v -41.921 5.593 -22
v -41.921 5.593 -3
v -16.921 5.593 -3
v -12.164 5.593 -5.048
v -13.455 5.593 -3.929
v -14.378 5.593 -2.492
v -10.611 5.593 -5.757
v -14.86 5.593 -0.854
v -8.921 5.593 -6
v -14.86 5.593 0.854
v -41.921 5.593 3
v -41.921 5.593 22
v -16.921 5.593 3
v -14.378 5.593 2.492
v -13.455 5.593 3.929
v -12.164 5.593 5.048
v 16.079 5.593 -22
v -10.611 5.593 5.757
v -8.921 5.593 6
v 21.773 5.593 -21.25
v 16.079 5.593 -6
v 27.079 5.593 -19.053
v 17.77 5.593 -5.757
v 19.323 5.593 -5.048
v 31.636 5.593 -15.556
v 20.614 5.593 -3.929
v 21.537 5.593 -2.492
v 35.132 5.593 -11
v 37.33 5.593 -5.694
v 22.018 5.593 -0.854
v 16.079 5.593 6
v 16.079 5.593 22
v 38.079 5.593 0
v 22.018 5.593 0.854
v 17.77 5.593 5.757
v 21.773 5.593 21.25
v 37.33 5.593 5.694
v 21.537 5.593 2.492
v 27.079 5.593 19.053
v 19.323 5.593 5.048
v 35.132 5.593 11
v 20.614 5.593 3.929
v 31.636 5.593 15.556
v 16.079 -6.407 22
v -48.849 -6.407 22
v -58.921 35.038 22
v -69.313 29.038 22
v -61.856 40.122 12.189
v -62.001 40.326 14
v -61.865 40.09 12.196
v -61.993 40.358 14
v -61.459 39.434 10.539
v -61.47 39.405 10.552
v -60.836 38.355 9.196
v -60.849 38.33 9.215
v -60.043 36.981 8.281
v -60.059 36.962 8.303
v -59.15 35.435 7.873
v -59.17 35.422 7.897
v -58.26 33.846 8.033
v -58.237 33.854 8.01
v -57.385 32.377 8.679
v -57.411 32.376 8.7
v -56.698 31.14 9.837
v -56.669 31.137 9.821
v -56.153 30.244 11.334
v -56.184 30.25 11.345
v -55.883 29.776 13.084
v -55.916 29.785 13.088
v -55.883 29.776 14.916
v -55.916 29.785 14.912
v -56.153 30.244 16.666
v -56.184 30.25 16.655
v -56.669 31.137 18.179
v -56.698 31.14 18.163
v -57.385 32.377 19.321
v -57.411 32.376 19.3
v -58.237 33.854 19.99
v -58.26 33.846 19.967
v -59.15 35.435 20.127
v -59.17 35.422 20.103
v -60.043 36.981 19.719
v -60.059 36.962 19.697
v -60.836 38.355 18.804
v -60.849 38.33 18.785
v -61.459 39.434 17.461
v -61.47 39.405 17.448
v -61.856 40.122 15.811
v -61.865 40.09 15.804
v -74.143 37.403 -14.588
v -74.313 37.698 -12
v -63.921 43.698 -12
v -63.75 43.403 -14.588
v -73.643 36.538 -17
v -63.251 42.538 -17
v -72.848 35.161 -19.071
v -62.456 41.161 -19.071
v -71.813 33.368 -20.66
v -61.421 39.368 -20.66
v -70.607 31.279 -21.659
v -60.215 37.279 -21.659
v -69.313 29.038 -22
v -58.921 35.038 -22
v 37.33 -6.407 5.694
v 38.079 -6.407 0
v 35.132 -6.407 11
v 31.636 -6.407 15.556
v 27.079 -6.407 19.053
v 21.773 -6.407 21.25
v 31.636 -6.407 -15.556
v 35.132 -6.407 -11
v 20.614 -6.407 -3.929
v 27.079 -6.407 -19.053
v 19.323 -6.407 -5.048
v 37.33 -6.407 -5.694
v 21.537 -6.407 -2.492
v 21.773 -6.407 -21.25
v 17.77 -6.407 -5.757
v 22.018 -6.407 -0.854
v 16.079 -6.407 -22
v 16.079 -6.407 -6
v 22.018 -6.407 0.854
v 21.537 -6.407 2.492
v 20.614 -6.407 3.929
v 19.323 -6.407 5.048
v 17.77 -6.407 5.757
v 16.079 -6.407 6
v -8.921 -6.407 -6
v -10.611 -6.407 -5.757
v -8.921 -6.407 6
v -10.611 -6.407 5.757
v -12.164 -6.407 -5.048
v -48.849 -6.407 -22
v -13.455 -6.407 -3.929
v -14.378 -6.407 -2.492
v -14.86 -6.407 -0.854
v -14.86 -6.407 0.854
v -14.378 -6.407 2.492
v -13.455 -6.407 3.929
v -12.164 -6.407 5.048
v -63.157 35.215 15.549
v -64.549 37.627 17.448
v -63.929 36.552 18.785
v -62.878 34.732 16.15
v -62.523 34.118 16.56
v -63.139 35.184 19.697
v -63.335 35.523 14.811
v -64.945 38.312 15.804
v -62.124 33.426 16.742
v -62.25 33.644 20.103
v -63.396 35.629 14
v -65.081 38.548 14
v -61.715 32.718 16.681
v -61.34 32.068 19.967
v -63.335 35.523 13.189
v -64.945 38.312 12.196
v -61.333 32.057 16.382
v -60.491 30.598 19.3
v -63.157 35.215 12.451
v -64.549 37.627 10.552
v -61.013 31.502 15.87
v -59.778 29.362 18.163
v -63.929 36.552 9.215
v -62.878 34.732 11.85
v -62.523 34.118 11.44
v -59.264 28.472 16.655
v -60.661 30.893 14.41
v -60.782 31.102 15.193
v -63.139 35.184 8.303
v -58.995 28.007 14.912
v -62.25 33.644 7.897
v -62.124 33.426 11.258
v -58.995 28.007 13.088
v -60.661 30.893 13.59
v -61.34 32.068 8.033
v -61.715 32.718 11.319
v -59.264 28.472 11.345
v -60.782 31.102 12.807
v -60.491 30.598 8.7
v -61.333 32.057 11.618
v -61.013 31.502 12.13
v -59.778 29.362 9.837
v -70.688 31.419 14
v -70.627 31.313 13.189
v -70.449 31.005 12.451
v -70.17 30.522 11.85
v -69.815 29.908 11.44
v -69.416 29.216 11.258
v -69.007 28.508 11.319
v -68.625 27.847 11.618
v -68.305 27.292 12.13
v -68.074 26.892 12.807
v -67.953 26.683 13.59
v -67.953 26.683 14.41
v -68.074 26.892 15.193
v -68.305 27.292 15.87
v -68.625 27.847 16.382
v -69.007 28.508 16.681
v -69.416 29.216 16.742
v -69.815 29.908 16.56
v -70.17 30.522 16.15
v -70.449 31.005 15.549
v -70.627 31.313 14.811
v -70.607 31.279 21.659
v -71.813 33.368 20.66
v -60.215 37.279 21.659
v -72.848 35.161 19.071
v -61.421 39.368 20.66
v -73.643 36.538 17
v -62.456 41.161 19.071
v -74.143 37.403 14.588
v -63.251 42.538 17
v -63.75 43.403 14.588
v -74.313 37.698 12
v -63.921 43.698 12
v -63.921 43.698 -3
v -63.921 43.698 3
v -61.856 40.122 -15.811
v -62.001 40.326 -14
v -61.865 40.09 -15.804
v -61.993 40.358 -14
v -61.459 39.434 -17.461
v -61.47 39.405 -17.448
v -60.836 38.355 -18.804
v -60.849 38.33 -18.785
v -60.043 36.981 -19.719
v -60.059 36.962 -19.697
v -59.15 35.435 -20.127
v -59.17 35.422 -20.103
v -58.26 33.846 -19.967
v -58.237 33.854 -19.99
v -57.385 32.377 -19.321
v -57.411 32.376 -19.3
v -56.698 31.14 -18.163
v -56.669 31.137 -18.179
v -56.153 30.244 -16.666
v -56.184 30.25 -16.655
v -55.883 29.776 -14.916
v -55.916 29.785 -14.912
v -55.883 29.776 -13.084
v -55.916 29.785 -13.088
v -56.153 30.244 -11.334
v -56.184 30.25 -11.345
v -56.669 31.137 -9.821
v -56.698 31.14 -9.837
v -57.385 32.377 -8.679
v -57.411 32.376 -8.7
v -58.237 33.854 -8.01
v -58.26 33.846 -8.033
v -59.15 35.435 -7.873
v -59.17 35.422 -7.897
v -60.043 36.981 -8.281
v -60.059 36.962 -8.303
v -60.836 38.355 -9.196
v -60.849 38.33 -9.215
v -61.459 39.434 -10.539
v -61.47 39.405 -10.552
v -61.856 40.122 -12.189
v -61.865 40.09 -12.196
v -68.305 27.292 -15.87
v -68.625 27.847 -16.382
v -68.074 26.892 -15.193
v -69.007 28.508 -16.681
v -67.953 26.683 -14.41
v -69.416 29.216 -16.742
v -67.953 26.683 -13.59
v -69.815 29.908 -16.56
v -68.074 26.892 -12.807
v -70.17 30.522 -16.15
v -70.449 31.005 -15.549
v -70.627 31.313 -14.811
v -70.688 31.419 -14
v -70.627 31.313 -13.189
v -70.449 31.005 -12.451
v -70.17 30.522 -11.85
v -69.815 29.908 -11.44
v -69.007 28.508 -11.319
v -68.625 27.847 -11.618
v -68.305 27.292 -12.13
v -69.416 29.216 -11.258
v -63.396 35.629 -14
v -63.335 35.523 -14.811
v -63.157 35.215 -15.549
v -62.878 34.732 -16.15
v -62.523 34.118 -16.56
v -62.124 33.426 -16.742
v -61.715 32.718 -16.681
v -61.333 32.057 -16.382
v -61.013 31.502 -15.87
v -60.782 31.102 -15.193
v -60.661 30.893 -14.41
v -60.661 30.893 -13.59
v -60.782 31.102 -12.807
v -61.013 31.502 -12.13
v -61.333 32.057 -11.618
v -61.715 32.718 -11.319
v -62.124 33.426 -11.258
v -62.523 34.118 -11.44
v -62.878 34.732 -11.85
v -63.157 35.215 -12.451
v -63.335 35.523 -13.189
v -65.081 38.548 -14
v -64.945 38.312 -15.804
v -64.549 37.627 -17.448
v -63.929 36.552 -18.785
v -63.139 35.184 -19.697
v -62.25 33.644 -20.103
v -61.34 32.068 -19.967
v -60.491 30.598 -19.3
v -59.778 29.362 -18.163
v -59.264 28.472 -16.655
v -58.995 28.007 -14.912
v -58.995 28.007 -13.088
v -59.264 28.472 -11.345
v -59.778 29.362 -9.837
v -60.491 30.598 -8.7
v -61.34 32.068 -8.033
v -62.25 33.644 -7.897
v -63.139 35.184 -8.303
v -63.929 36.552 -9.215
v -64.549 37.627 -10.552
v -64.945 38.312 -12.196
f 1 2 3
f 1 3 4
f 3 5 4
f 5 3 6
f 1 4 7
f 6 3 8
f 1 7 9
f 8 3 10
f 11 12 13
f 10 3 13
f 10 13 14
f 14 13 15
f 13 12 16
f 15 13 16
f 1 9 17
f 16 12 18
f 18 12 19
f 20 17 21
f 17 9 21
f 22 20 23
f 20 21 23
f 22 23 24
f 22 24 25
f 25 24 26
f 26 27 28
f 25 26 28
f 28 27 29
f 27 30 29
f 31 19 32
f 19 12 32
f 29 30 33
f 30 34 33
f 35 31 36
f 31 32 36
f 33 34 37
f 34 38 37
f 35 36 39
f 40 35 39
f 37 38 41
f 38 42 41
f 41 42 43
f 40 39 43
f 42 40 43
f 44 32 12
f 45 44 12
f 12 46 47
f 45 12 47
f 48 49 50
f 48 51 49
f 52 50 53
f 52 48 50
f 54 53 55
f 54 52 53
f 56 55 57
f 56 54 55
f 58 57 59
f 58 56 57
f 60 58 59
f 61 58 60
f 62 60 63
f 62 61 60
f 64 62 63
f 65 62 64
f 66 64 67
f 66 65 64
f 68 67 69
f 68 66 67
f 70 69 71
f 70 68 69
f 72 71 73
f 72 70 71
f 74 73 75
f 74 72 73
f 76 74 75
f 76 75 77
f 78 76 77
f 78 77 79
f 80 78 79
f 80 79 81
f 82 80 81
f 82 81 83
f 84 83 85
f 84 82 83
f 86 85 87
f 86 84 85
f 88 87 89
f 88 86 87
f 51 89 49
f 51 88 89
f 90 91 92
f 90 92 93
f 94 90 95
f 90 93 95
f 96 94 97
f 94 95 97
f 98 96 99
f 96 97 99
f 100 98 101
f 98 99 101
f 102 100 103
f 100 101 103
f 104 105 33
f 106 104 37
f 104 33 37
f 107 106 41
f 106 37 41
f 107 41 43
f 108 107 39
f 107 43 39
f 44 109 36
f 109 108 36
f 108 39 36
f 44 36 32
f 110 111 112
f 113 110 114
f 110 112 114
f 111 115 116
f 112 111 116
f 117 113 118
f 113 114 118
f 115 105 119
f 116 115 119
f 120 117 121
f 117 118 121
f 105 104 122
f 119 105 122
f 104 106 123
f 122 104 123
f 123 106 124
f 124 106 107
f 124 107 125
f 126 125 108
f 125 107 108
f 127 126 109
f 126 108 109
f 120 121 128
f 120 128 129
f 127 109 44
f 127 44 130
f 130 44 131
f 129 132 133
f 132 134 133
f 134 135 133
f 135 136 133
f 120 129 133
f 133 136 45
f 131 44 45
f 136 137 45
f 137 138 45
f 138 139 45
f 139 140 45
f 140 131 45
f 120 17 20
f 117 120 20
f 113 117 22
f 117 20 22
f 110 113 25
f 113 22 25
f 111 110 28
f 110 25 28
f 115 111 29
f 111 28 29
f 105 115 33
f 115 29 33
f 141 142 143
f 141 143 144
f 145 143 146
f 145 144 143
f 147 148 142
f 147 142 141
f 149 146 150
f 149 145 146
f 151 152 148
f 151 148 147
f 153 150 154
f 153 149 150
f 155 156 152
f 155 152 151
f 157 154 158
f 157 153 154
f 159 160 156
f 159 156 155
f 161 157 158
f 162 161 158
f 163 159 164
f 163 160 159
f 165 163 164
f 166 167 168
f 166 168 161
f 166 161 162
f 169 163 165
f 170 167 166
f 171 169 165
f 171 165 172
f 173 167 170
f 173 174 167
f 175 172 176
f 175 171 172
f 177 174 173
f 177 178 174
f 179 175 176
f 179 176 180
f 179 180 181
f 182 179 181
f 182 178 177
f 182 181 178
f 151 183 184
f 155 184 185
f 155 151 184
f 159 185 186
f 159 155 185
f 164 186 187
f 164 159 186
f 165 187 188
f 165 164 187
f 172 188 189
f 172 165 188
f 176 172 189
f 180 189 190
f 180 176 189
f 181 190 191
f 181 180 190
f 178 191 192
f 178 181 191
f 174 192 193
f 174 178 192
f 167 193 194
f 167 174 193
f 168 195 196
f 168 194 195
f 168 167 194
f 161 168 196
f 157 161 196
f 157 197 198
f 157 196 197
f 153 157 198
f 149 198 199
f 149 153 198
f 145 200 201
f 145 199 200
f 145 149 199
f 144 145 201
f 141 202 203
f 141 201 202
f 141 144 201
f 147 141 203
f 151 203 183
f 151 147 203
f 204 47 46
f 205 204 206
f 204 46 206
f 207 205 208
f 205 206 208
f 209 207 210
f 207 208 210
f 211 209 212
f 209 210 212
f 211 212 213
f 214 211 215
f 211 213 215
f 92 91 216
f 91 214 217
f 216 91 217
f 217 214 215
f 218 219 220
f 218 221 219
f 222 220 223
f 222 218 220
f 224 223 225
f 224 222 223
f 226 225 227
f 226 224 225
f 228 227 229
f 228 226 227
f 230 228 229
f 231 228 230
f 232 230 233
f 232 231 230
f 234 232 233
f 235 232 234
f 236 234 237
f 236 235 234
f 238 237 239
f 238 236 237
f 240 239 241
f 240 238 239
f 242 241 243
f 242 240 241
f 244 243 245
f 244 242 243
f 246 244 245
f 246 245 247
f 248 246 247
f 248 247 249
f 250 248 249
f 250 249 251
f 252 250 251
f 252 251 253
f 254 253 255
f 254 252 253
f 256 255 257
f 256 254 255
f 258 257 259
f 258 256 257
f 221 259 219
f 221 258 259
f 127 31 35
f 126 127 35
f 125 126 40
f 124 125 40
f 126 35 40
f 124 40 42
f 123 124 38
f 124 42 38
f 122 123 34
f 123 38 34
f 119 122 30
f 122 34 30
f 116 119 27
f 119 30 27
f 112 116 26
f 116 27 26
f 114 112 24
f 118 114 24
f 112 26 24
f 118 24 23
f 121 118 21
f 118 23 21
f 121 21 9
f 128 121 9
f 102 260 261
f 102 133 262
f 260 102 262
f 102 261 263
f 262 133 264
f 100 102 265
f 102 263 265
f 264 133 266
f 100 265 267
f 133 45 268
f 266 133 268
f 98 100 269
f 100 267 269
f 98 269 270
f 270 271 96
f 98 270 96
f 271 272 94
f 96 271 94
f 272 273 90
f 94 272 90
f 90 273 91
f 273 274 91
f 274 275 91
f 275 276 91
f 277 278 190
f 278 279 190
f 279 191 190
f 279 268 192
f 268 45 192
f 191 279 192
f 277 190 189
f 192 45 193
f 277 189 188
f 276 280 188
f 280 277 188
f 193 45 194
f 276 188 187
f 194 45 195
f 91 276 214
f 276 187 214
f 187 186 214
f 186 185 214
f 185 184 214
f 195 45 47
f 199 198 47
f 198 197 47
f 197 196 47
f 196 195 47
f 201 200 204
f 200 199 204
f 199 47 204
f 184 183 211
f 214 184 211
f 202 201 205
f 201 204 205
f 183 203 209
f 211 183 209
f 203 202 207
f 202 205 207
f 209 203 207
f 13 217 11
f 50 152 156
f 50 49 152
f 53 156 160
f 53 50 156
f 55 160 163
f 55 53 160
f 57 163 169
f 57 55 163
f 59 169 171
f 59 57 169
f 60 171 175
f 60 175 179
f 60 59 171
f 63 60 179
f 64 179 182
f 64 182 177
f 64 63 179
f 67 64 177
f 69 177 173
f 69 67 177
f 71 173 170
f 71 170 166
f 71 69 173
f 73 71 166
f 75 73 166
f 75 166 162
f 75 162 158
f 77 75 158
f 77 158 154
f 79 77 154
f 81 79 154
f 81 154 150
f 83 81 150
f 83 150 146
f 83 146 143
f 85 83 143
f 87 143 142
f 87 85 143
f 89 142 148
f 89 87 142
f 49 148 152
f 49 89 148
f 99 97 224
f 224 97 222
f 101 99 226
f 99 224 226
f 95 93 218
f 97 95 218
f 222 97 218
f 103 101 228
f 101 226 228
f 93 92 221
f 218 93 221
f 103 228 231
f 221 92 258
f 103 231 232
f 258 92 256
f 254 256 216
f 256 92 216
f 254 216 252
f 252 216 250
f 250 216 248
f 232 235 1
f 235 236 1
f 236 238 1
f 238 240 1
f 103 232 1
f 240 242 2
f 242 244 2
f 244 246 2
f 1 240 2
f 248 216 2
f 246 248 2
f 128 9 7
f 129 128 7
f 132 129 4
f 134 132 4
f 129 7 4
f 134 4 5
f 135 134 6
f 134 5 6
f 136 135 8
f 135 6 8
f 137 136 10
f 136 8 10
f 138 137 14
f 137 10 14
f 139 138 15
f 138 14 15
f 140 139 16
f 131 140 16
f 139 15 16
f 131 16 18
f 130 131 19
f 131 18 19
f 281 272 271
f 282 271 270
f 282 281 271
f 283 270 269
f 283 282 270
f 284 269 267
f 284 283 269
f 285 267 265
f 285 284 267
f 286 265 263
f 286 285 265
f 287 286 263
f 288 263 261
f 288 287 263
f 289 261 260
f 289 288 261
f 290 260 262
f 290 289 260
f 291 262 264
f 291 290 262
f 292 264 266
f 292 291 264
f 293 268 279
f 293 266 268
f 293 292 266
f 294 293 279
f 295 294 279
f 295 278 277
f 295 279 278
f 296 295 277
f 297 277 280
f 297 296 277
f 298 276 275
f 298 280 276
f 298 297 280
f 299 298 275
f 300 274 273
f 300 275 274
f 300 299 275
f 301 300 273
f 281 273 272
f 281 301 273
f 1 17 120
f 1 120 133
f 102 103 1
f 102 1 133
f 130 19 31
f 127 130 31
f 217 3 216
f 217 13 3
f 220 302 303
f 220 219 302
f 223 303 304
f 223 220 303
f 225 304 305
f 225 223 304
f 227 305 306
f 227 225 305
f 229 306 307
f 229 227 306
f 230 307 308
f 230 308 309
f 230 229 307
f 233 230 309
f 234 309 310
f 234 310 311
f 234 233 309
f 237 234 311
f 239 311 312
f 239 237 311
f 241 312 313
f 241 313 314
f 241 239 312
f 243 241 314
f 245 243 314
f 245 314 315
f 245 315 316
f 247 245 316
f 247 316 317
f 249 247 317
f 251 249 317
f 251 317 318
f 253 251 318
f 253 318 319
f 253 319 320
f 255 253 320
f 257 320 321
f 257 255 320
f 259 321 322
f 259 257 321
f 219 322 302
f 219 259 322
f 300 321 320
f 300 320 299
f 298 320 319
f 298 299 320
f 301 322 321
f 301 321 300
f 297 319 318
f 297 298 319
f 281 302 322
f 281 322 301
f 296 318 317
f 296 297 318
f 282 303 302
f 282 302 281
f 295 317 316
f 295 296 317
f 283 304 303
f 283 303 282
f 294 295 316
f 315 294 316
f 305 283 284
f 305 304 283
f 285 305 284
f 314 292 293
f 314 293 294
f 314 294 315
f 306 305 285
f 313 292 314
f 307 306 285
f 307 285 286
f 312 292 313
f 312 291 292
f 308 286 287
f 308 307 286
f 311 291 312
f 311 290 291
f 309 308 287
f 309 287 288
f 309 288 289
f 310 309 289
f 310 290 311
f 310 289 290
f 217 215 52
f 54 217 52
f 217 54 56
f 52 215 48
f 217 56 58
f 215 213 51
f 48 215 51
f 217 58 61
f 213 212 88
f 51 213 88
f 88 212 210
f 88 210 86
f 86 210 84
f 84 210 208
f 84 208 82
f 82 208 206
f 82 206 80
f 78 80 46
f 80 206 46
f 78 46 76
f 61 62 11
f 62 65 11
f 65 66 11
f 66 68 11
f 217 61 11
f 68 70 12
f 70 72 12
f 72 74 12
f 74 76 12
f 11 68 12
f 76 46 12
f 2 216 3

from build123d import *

# Parameters (mm, degrees)
BOSS_EXTRUDE1_DEPTH                    = 22
CBORE_FOR_M5_HEX_HEAD_BOLT1_AT_2_COUNT = 2
CBORE_FOR_M5_HEX_HEAD_BOLT1_AT_2_PITCH = 28
BOSS_EXTRUDE2_DEPTH                    = 3
CUT_EXTRUDE1_DEPTH                     = 87.362098425
FILLET2_R                              = 10
FILLET3_R                              = 10


with BuildPart() as part:
    # Sketch1 → Boss-Extrude1 (new, symmetric)
    with BuildSketch(Plane.XY):
        Polygon((-41.920628378, 5.592699718), (38.079371622, 5.592699718), (38.079371622, -6.407300282), (-48.848831609, -6.407300282), (-74.312933224, 37.697817484), (-63.920628378, 43.697817484), align=None)
    extrude(amount=BOSS_EXTRUDE1_DEPTH, both=True)

    # Sketch3 → CBORE for M5 Hex Head Bolt1 (revolve, cut)
    with BuildSketch(Plane(origin=(-58.920628378, 35.037563446, -14), x_dir=(-0.4999999999999982, 0.8660254037844396, 0), z_dir=(0, 0, 1))):
        Polygon((0, 0), (0, 34.052558883), (2.75, 34.052558883), (2.75, 3.58), (6.12, 3.58), (6.12, 0.024), (6.144, 0), align=None)
    cbore_for_m5_hex_head_bolt1 = revolve(axis=Axis((-53.421367064, 38.212563446, -14), (-0.8660254037844397, -0.4999999999999983, 0)), mode=Mode.SUBTRACT)

    # CBORE for M5 Hex Head Bolt1 at 2: CBORE for M5 Hex Head Bolt1 ×2
    with Locations(*[(0, 0, i * CBORE_FOR_M5_HEX_HEAD_BOLT1_AT_2_PITCH) for i in range(1, CBORE_FOR_M5_HEX_HEAD_BOLT1_AT_2_COUNT)]):
        add(cbore_for_m5_hex_head_bolt1, mode=Mode.SUBTRACT)

    # Sketch4 → Boss-Extrude2 (add, symmetric)
    with BuildSketch(Plane.XY):
        Polygon((-63.920628378, 43.697817484), (-41.920628378, 5.592699718), (-16.920628378, 5.592699718), align=None)
    extrude(amount=BOSS_EXTRUDE2_DEPTH, both=True)

    # Sketch5 → Cut-Extrude1 (cut, through all)
    with BuildSketch(Plane(origin=(0, 5.592699718, 0), x_dir=(1, 0, 0), z_dir=(0, 1, 0))):
        with BuildLine():
            ThreePointArc((16.079371622, 22), (31.635720831, 15.556349163), (38.079371622, -6.4e-08))
            Line((38.079371622, -6.4e-08), (38.079371622, 22))
            Line((38.079371622, 22), (16.079371622, 22))
        make_face()
        with BuildLine():
            ThreePointArc((38.079371622, -6.4e-08), (31.635720785, -15.556349209), (16.079371622, -22))
            Line((16.079371622, -22), (38.079371622, -22))
            Line((38.079371622, -22), (38.079371622, -6.4e-08))
        make_face()
        with BuildLine():
            Line((-8.920628378, -6), (16.079371622, -6))
            ThreePointArc((16.079371622, -6), (22.079371622, 0), (16.079371622, 6))
            Line((16.079371622, 6), (-8.920628378, 6))
            ThreePointArc((-8.920628378, 6), (-14.920628378, 0), (-8.920628378, -6))
        make_face()
    extrude(amount=-CUT_EXTRUDE1_DEPTH, mode=Mode.SUBTRACT)

    # Fillet2
    fillet2_edges = [part.edges().sort_by_distance(p)[0] for p in [
        (-69.116780801, 40.697817484, 22),
    ]]
    fillet(fillet2_edges, radius=FILLET2_R)

    # Fillet3
    fillet3_edges = [part.edges().sort_by_distance(p)[0] for p in [
        (-69.116780801, 40.697817484, -22),
    ]]
    fillet(fillet3_edges, radius=FILLET3_R)


solid = part.part
